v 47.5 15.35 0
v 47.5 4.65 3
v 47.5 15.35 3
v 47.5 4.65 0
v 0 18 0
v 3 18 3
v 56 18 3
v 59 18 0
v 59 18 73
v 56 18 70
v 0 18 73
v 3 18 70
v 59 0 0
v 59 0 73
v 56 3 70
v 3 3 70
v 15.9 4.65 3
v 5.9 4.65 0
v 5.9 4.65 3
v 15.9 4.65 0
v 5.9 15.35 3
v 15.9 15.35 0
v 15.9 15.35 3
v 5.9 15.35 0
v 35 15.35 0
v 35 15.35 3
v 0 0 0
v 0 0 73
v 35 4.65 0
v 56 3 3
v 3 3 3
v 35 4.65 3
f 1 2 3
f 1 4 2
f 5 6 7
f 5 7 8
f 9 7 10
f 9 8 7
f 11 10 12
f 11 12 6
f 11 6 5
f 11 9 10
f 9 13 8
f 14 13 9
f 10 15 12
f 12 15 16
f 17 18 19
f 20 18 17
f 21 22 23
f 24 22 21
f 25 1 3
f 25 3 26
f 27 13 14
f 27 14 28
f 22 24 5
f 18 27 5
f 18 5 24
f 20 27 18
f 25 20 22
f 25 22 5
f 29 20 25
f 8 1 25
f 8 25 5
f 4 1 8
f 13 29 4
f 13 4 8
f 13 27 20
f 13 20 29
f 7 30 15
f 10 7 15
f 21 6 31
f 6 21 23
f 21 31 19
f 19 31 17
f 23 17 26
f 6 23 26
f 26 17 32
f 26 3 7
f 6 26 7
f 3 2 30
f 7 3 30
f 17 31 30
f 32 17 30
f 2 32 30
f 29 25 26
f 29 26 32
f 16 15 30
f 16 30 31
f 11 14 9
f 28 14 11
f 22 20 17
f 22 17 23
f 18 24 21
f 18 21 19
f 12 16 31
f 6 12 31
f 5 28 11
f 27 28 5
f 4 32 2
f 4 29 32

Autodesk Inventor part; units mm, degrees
ref_plane "YZ Plane" through (0, 0, 0) normal (1, 0, 0) x (0, 1, 0)
ref_plane "XZ Plane" through (0, 0, 0) normal (0, 1, 0) x (-1, 0, 0)
ref_plane "XY Plane" through (0, 0, 0) normal (0, 0, 1) x (1, 0, 0)
sketch "Sketch2" plane through (0, 0, 0) normal (0, 1, 0) x (-1, 0, 0)
  line L0 (0, 0) -> (-59, 0)
  line L1 (-59, 0) -> (-59, 73)
  line L2 (-59, 73) -> (0, 73)
  line L3 (0, 73) -> (0, 0)
  dimension "d0" = 59
  dimension "d1" = 73
extrude "Extrusion1" add sketch "Sketch2" along normal blind 18
shell "Shell1" thickness 3 removed faces 1 at (19.6667, 18, 24.3333)
sketch "Sketch3" plane through (59, 0, 0) normal (0, 0, -1) x (-1, 0, 0)
  line L0 (11.5, 15.35) -> (24, 15.35)
  line L1 (24, 15.35) -> (24, 4.65)
  line L2 (24, 4.65) -> (11.5, 4.65)
  line L3 (11.5, 4.65) -> (11.5, 15.35)
  line L4 (0, 0) -> (0, 18) projected
  line L5 (0, 0) -> (59, 0) projected
  line L6 (43.1, 15.35) -> (53.1, 15.35)
  line L7 (53.1, 15.35) -> (53.1, 4.65)
  line L8 (53.1, 4.65) -> (43.1, 4.65)
  line L9 (43.1, 4.65) -> (43.1, 15.35)
  line L10 (59, 0) -> (59, 18) projected
  dimension "d5" = 11.5
  dimension "d6" = 4.65
  dimension "d7" = 12.5
  dimension "d8" = 10.7
  dimension "d10" = 10
  dimension "d11" = 10.7
  dimension "d12" = 4.65
  dimension "d16" = 43.1
extrude "Extrusion2" cut sketch "Sketch3" against normal blind 30
equation "\"d11\" = d8"
equation "\"d12\" = d6"
properties part number "arduino array box v02"
